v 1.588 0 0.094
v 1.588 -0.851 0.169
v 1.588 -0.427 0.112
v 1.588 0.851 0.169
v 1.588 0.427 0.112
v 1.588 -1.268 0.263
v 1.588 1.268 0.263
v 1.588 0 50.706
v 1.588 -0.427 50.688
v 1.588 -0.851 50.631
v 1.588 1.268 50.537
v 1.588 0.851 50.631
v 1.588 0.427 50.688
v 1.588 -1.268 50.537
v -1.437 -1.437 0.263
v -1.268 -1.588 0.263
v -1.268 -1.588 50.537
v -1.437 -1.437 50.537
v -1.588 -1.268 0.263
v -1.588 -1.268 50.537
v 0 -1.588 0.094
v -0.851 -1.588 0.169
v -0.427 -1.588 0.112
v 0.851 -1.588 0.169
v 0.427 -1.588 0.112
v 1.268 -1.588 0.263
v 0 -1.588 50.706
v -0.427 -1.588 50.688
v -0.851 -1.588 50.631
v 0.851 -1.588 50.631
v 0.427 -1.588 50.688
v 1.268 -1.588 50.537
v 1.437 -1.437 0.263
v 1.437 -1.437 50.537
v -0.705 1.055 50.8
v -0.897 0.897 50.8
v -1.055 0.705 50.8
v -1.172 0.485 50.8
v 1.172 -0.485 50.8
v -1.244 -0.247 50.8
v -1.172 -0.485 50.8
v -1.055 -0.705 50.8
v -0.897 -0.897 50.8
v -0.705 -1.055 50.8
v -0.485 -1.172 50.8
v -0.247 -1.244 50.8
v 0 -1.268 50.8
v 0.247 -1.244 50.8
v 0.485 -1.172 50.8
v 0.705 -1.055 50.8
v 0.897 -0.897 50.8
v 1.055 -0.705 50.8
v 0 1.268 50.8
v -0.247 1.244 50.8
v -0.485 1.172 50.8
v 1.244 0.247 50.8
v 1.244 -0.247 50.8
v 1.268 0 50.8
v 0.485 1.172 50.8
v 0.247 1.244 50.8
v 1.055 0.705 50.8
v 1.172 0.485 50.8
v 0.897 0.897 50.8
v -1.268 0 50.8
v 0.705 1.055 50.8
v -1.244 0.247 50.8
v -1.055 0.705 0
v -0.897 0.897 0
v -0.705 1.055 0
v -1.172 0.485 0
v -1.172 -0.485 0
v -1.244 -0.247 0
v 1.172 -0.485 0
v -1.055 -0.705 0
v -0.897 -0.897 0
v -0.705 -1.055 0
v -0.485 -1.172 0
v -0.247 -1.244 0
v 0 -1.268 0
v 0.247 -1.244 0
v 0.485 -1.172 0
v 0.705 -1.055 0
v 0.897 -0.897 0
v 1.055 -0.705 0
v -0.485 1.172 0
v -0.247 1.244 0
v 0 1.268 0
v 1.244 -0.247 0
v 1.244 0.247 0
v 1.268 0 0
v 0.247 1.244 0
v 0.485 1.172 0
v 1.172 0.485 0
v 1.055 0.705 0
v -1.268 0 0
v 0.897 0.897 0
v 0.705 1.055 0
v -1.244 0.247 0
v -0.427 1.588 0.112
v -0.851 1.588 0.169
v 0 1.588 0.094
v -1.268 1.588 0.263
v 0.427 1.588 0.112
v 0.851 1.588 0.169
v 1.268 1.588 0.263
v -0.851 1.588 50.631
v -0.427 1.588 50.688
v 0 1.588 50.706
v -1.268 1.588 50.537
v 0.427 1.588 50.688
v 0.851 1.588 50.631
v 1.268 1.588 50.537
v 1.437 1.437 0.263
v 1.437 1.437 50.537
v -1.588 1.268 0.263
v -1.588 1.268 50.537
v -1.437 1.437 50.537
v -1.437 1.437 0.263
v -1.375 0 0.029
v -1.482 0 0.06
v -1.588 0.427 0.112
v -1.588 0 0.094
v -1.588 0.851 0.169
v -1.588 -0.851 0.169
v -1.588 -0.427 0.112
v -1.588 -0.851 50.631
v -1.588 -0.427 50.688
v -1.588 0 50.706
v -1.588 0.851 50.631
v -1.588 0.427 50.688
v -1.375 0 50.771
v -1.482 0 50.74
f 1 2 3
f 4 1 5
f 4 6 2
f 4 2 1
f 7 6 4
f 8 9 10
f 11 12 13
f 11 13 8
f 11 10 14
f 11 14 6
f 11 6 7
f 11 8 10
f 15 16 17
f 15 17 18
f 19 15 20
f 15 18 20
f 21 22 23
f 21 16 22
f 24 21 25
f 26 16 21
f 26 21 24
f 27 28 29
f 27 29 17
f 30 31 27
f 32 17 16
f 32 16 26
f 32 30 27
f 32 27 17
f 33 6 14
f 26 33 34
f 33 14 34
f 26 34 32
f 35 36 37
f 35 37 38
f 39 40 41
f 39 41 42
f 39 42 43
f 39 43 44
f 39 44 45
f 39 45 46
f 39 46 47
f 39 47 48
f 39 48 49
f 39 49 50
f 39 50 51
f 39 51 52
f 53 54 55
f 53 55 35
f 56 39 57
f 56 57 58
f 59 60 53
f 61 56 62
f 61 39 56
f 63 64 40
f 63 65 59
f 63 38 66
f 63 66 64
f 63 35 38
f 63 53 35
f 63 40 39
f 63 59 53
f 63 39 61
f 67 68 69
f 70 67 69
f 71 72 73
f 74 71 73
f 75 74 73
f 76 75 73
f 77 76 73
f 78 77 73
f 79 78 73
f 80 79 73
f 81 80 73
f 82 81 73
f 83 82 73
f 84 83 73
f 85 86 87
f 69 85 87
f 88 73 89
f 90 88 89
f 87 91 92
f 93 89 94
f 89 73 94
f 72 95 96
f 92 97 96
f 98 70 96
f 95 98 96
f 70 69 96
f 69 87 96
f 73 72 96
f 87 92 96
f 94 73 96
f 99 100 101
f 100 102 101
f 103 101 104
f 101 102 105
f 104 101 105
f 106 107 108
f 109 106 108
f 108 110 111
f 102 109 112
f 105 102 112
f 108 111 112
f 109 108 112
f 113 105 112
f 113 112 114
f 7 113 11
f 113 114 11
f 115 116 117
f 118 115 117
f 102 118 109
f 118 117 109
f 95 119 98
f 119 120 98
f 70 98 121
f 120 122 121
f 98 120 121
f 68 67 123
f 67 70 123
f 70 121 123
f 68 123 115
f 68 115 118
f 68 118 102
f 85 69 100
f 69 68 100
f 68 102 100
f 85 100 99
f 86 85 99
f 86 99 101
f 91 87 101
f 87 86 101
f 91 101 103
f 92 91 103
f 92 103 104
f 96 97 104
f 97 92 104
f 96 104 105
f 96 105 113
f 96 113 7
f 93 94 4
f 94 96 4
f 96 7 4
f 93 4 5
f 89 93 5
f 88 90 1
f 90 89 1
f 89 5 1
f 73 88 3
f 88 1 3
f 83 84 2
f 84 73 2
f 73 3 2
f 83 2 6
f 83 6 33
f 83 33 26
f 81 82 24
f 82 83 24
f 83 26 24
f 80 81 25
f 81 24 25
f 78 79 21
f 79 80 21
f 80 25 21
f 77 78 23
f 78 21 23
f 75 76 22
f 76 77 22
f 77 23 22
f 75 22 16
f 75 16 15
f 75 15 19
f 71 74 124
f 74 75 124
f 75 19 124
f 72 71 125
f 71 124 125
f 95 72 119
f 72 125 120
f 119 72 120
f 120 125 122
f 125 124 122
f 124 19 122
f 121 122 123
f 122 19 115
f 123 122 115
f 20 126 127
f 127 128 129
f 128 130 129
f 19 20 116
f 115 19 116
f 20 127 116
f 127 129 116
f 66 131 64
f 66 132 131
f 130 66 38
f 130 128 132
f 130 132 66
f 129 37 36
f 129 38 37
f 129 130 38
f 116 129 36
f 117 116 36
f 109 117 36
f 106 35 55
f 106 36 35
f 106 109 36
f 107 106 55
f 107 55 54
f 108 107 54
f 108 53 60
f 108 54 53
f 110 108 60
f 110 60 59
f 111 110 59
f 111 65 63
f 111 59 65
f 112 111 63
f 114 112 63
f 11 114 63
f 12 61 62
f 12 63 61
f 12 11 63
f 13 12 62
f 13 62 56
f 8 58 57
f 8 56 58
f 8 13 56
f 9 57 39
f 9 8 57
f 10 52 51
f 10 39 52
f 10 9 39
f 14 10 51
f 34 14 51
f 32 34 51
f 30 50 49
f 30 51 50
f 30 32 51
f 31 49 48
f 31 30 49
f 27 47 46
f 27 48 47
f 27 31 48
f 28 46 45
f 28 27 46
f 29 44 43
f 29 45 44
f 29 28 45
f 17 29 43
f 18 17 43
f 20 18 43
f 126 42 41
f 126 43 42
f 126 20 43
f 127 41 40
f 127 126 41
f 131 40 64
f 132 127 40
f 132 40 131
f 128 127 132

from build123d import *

# Parameters (mm, degrees)
SKETCH1_W           = 3.175
SKETCH1_H           = 3.175
BOSS_EXTRUDE1_DEPTH = 25.4
SKETCH2_OUTSIDE_W   = 10.334
SKETCH2_OUTSIDE_H   = 10.334
SKETCH2_OUTSIDE_R   = 2.032
CUT_EXTRUDE1_DEPTH  = 26.4


with BuildPart() as part:
    # Sketch1 → Boss-Extrude1 (new body)
    with BuildSketch(Plane.XY):
        Rectangle(SKETCH1_W, SKETCH1_H)
    extrude(amount=BOSS_EXTRUDE1_DEPTH)

    # Sketch2 outside → Cut-Extrude1 (cut, through all)
    with BuildSketch(Plane(origin=(0, 0, 0), x_dir=(-1, 0, 0), z_dir=(0, 0, -1))):
        Rectangle(SKETCH2_OUTSIDE_W, SKETCH2_OUTSIDE_H)
        Circle(SKETCH2_OUTSIDE_R, mode=Mode.SUBTRACT)
    extrude(amount=-CUT_EXTRUDE1_DEPTH, mode=Mode.SUBTRACT)

    # Sketch3 → Cut-Revolve1 (revolve, cut)
    with BuildSketch(Plane(origin=(0, 0, 0), x_dir=(1, 0, 0), z_dir=(0, 1, 0))):
        with BuildLine():
            Line((-5.053685963, -4.40273269), (-5.053685963, 5.740530545))
            Line((-5.053685963, 5.740530545), (0, 5.740530545))
            Line((0, 5.740530545), (0, 0.160877736))
            ThreePointArc((0, 0.160877736), (-3.404639553, -1.148866368), (-5.053685963, -4.40273269))
        make_face()
    revolve(axis=Axis((0, 0, 25.4), (0, 0, -1)), mode=Mode.SUBTRACT)

    # Mirror1: part across plane


with BuildPart() as part_1:
    add(part.part)
    add(part.part.mirror(Plane(origin=(0, 0, 25.4), x_dir=(1, 0, 0), z_dir=(0, 0, -1))))


solid = part_1.part
